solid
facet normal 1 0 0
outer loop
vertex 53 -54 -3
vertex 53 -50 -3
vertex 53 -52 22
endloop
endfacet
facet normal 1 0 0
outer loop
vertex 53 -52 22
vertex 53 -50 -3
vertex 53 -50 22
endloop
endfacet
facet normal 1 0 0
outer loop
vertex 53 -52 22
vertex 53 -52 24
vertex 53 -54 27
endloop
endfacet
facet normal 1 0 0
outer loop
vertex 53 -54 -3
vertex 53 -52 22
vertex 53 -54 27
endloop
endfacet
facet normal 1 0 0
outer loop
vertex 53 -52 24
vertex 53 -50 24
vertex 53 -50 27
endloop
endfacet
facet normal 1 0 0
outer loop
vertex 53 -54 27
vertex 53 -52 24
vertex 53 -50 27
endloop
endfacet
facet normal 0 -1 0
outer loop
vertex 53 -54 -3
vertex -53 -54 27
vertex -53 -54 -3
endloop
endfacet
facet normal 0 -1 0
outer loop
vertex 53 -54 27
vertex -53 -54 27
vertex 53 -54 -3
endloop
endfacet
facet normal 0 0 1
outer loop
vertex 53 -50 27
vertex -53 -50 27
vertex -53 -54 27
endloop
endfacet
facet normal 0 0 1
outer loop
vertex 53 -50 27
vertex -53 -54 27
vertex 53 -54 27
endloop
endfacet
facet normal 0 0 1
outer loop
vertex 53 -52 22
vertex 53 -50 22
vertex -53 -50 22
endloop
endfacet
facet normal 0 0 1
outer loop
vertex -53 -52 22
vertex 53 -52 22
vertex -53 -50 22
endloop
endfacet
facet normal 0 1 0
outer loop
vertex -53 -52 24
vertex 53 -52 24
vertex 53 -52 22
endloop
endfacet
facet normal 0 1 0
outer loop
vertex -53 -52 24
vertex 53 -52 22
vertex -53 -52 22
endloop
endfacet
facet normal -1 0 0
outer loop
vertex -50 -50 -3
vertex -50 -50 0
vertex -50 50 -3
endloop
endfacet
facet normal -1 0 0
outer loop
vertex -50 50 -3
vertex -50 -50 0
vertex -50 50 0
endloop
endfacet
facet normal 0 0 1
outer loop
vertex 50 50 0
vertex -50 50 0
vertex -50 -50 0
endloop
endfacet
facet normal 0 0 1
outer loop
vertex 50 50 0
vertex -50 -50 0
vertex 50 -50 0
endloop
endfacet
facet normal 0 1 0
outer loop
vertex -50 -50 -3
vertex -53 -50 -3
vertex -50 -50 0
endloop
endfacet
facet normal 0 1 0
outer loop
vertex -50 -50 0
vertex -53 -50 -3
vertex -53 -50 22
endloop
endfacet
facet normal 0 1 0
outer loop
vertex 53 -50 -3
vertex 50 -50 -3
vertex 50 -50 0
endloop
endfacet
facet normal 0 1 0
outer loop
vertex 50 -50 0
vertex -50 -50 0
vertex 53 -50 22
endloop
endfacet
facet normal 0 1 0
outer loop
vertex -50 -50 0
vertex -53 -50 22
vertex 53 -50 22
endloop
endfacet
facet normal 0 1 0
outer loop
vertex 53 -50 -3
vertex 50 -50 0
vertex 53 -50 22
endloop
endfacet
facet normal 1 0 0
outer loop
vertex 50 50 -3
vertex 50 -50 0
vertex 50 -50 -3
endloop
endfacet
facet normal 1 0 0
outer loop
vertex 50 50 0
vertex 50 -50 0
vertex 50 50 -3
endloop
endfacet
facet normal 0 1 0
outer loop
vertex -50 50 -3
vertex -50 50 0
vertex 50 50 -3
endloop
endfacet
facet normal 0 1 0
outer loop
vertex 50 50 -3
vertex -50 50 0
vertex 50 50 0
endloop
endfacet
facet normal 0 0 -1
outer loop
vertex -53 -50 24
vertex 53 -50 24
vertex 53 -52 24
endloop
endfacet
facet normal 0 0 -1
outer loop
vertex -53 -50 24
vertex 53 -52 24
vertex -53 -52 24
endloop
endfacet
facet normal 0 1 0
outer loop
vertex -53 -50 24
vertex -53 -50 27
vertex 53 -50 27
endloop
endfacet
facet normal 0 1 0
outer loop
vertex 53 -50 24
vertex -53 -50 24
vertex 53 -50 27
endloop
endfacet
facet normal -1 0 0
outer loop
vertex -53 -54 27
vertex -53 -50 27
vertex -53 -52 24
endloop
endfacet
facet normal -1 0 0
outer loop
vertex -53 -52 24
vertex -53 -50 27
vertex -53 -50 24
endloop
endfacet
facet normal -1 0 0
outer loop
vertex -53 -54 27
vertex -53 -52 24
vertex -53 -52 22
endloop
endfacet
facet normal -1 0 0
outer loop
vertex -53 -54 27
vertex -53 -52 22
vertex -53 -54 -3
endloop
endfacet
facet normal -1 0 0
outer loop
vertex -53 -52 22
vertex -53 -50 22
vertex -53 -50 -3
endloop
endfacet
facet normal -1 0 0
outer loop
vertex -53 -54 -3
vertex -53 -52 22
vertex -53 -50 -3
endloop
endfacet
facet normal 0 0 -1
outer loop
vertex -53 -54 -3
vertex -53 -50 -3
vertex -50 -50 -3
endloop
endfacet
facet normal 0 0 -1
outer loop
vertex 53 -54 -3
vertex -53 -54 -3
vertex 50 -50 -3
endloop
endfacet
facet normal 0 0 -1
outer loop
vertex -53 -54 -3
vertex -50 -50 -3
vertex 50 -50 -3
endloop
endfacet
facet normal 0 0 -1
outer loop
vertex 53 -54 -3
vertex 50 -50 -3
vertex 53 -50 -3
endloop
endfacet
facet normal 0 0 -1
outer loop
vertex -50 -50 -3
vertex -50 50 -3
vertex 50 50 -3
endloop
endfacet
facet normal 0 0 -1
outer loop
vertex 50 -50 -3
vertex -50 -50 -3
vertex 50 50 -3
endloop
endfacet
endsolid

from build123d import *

# Parameters (mm, degrees)
F0_W     = 100
F0_H     = 100
F1_DEPTH = 3
F2_W     = 106
F2_H     = 25
F2_H_2   = 2
F2_H_3   = 3
F3_DEPTH = 4
F4_W     = 106
F4_H     = 2
F5_DEPTH = 2


with BuildPart() as f1:
    # F0 (on Top) → F1 (new body)
    with BuildSketch(Plane.XY):
        Rectangle(F0_W, F0_H)
    extrude(amount=-F1_DEPTH)

    # F2 (on face) → F3 (join)
    with BuildSketch(Plane.XZ.offset(50)):
        with Locations((0, 9.5)):
            Rectangle(F2_W, F2_H)
        with Locations((0, 23)):
            Rectangle(F2_W, F2_H_2)
        with Locations((0, 25.5)):
            Rectangle(F2_W, F2_H_3)
    extrude(amount=F3_DEPTH)

    # F4 (on face) → F5 (cut)
    with BuildSketch(Plane(origin=(0, -50, 0), x_dir=(-1, 0, 0), z_dir=(0, 1, 0))):
        with Locations((0, 23)):
            Rectangle(F4_W, F4_H)
    extrude(amount=-F5_DEPTH, mode=Mode.SUBTRACT)


solid = f1.part
